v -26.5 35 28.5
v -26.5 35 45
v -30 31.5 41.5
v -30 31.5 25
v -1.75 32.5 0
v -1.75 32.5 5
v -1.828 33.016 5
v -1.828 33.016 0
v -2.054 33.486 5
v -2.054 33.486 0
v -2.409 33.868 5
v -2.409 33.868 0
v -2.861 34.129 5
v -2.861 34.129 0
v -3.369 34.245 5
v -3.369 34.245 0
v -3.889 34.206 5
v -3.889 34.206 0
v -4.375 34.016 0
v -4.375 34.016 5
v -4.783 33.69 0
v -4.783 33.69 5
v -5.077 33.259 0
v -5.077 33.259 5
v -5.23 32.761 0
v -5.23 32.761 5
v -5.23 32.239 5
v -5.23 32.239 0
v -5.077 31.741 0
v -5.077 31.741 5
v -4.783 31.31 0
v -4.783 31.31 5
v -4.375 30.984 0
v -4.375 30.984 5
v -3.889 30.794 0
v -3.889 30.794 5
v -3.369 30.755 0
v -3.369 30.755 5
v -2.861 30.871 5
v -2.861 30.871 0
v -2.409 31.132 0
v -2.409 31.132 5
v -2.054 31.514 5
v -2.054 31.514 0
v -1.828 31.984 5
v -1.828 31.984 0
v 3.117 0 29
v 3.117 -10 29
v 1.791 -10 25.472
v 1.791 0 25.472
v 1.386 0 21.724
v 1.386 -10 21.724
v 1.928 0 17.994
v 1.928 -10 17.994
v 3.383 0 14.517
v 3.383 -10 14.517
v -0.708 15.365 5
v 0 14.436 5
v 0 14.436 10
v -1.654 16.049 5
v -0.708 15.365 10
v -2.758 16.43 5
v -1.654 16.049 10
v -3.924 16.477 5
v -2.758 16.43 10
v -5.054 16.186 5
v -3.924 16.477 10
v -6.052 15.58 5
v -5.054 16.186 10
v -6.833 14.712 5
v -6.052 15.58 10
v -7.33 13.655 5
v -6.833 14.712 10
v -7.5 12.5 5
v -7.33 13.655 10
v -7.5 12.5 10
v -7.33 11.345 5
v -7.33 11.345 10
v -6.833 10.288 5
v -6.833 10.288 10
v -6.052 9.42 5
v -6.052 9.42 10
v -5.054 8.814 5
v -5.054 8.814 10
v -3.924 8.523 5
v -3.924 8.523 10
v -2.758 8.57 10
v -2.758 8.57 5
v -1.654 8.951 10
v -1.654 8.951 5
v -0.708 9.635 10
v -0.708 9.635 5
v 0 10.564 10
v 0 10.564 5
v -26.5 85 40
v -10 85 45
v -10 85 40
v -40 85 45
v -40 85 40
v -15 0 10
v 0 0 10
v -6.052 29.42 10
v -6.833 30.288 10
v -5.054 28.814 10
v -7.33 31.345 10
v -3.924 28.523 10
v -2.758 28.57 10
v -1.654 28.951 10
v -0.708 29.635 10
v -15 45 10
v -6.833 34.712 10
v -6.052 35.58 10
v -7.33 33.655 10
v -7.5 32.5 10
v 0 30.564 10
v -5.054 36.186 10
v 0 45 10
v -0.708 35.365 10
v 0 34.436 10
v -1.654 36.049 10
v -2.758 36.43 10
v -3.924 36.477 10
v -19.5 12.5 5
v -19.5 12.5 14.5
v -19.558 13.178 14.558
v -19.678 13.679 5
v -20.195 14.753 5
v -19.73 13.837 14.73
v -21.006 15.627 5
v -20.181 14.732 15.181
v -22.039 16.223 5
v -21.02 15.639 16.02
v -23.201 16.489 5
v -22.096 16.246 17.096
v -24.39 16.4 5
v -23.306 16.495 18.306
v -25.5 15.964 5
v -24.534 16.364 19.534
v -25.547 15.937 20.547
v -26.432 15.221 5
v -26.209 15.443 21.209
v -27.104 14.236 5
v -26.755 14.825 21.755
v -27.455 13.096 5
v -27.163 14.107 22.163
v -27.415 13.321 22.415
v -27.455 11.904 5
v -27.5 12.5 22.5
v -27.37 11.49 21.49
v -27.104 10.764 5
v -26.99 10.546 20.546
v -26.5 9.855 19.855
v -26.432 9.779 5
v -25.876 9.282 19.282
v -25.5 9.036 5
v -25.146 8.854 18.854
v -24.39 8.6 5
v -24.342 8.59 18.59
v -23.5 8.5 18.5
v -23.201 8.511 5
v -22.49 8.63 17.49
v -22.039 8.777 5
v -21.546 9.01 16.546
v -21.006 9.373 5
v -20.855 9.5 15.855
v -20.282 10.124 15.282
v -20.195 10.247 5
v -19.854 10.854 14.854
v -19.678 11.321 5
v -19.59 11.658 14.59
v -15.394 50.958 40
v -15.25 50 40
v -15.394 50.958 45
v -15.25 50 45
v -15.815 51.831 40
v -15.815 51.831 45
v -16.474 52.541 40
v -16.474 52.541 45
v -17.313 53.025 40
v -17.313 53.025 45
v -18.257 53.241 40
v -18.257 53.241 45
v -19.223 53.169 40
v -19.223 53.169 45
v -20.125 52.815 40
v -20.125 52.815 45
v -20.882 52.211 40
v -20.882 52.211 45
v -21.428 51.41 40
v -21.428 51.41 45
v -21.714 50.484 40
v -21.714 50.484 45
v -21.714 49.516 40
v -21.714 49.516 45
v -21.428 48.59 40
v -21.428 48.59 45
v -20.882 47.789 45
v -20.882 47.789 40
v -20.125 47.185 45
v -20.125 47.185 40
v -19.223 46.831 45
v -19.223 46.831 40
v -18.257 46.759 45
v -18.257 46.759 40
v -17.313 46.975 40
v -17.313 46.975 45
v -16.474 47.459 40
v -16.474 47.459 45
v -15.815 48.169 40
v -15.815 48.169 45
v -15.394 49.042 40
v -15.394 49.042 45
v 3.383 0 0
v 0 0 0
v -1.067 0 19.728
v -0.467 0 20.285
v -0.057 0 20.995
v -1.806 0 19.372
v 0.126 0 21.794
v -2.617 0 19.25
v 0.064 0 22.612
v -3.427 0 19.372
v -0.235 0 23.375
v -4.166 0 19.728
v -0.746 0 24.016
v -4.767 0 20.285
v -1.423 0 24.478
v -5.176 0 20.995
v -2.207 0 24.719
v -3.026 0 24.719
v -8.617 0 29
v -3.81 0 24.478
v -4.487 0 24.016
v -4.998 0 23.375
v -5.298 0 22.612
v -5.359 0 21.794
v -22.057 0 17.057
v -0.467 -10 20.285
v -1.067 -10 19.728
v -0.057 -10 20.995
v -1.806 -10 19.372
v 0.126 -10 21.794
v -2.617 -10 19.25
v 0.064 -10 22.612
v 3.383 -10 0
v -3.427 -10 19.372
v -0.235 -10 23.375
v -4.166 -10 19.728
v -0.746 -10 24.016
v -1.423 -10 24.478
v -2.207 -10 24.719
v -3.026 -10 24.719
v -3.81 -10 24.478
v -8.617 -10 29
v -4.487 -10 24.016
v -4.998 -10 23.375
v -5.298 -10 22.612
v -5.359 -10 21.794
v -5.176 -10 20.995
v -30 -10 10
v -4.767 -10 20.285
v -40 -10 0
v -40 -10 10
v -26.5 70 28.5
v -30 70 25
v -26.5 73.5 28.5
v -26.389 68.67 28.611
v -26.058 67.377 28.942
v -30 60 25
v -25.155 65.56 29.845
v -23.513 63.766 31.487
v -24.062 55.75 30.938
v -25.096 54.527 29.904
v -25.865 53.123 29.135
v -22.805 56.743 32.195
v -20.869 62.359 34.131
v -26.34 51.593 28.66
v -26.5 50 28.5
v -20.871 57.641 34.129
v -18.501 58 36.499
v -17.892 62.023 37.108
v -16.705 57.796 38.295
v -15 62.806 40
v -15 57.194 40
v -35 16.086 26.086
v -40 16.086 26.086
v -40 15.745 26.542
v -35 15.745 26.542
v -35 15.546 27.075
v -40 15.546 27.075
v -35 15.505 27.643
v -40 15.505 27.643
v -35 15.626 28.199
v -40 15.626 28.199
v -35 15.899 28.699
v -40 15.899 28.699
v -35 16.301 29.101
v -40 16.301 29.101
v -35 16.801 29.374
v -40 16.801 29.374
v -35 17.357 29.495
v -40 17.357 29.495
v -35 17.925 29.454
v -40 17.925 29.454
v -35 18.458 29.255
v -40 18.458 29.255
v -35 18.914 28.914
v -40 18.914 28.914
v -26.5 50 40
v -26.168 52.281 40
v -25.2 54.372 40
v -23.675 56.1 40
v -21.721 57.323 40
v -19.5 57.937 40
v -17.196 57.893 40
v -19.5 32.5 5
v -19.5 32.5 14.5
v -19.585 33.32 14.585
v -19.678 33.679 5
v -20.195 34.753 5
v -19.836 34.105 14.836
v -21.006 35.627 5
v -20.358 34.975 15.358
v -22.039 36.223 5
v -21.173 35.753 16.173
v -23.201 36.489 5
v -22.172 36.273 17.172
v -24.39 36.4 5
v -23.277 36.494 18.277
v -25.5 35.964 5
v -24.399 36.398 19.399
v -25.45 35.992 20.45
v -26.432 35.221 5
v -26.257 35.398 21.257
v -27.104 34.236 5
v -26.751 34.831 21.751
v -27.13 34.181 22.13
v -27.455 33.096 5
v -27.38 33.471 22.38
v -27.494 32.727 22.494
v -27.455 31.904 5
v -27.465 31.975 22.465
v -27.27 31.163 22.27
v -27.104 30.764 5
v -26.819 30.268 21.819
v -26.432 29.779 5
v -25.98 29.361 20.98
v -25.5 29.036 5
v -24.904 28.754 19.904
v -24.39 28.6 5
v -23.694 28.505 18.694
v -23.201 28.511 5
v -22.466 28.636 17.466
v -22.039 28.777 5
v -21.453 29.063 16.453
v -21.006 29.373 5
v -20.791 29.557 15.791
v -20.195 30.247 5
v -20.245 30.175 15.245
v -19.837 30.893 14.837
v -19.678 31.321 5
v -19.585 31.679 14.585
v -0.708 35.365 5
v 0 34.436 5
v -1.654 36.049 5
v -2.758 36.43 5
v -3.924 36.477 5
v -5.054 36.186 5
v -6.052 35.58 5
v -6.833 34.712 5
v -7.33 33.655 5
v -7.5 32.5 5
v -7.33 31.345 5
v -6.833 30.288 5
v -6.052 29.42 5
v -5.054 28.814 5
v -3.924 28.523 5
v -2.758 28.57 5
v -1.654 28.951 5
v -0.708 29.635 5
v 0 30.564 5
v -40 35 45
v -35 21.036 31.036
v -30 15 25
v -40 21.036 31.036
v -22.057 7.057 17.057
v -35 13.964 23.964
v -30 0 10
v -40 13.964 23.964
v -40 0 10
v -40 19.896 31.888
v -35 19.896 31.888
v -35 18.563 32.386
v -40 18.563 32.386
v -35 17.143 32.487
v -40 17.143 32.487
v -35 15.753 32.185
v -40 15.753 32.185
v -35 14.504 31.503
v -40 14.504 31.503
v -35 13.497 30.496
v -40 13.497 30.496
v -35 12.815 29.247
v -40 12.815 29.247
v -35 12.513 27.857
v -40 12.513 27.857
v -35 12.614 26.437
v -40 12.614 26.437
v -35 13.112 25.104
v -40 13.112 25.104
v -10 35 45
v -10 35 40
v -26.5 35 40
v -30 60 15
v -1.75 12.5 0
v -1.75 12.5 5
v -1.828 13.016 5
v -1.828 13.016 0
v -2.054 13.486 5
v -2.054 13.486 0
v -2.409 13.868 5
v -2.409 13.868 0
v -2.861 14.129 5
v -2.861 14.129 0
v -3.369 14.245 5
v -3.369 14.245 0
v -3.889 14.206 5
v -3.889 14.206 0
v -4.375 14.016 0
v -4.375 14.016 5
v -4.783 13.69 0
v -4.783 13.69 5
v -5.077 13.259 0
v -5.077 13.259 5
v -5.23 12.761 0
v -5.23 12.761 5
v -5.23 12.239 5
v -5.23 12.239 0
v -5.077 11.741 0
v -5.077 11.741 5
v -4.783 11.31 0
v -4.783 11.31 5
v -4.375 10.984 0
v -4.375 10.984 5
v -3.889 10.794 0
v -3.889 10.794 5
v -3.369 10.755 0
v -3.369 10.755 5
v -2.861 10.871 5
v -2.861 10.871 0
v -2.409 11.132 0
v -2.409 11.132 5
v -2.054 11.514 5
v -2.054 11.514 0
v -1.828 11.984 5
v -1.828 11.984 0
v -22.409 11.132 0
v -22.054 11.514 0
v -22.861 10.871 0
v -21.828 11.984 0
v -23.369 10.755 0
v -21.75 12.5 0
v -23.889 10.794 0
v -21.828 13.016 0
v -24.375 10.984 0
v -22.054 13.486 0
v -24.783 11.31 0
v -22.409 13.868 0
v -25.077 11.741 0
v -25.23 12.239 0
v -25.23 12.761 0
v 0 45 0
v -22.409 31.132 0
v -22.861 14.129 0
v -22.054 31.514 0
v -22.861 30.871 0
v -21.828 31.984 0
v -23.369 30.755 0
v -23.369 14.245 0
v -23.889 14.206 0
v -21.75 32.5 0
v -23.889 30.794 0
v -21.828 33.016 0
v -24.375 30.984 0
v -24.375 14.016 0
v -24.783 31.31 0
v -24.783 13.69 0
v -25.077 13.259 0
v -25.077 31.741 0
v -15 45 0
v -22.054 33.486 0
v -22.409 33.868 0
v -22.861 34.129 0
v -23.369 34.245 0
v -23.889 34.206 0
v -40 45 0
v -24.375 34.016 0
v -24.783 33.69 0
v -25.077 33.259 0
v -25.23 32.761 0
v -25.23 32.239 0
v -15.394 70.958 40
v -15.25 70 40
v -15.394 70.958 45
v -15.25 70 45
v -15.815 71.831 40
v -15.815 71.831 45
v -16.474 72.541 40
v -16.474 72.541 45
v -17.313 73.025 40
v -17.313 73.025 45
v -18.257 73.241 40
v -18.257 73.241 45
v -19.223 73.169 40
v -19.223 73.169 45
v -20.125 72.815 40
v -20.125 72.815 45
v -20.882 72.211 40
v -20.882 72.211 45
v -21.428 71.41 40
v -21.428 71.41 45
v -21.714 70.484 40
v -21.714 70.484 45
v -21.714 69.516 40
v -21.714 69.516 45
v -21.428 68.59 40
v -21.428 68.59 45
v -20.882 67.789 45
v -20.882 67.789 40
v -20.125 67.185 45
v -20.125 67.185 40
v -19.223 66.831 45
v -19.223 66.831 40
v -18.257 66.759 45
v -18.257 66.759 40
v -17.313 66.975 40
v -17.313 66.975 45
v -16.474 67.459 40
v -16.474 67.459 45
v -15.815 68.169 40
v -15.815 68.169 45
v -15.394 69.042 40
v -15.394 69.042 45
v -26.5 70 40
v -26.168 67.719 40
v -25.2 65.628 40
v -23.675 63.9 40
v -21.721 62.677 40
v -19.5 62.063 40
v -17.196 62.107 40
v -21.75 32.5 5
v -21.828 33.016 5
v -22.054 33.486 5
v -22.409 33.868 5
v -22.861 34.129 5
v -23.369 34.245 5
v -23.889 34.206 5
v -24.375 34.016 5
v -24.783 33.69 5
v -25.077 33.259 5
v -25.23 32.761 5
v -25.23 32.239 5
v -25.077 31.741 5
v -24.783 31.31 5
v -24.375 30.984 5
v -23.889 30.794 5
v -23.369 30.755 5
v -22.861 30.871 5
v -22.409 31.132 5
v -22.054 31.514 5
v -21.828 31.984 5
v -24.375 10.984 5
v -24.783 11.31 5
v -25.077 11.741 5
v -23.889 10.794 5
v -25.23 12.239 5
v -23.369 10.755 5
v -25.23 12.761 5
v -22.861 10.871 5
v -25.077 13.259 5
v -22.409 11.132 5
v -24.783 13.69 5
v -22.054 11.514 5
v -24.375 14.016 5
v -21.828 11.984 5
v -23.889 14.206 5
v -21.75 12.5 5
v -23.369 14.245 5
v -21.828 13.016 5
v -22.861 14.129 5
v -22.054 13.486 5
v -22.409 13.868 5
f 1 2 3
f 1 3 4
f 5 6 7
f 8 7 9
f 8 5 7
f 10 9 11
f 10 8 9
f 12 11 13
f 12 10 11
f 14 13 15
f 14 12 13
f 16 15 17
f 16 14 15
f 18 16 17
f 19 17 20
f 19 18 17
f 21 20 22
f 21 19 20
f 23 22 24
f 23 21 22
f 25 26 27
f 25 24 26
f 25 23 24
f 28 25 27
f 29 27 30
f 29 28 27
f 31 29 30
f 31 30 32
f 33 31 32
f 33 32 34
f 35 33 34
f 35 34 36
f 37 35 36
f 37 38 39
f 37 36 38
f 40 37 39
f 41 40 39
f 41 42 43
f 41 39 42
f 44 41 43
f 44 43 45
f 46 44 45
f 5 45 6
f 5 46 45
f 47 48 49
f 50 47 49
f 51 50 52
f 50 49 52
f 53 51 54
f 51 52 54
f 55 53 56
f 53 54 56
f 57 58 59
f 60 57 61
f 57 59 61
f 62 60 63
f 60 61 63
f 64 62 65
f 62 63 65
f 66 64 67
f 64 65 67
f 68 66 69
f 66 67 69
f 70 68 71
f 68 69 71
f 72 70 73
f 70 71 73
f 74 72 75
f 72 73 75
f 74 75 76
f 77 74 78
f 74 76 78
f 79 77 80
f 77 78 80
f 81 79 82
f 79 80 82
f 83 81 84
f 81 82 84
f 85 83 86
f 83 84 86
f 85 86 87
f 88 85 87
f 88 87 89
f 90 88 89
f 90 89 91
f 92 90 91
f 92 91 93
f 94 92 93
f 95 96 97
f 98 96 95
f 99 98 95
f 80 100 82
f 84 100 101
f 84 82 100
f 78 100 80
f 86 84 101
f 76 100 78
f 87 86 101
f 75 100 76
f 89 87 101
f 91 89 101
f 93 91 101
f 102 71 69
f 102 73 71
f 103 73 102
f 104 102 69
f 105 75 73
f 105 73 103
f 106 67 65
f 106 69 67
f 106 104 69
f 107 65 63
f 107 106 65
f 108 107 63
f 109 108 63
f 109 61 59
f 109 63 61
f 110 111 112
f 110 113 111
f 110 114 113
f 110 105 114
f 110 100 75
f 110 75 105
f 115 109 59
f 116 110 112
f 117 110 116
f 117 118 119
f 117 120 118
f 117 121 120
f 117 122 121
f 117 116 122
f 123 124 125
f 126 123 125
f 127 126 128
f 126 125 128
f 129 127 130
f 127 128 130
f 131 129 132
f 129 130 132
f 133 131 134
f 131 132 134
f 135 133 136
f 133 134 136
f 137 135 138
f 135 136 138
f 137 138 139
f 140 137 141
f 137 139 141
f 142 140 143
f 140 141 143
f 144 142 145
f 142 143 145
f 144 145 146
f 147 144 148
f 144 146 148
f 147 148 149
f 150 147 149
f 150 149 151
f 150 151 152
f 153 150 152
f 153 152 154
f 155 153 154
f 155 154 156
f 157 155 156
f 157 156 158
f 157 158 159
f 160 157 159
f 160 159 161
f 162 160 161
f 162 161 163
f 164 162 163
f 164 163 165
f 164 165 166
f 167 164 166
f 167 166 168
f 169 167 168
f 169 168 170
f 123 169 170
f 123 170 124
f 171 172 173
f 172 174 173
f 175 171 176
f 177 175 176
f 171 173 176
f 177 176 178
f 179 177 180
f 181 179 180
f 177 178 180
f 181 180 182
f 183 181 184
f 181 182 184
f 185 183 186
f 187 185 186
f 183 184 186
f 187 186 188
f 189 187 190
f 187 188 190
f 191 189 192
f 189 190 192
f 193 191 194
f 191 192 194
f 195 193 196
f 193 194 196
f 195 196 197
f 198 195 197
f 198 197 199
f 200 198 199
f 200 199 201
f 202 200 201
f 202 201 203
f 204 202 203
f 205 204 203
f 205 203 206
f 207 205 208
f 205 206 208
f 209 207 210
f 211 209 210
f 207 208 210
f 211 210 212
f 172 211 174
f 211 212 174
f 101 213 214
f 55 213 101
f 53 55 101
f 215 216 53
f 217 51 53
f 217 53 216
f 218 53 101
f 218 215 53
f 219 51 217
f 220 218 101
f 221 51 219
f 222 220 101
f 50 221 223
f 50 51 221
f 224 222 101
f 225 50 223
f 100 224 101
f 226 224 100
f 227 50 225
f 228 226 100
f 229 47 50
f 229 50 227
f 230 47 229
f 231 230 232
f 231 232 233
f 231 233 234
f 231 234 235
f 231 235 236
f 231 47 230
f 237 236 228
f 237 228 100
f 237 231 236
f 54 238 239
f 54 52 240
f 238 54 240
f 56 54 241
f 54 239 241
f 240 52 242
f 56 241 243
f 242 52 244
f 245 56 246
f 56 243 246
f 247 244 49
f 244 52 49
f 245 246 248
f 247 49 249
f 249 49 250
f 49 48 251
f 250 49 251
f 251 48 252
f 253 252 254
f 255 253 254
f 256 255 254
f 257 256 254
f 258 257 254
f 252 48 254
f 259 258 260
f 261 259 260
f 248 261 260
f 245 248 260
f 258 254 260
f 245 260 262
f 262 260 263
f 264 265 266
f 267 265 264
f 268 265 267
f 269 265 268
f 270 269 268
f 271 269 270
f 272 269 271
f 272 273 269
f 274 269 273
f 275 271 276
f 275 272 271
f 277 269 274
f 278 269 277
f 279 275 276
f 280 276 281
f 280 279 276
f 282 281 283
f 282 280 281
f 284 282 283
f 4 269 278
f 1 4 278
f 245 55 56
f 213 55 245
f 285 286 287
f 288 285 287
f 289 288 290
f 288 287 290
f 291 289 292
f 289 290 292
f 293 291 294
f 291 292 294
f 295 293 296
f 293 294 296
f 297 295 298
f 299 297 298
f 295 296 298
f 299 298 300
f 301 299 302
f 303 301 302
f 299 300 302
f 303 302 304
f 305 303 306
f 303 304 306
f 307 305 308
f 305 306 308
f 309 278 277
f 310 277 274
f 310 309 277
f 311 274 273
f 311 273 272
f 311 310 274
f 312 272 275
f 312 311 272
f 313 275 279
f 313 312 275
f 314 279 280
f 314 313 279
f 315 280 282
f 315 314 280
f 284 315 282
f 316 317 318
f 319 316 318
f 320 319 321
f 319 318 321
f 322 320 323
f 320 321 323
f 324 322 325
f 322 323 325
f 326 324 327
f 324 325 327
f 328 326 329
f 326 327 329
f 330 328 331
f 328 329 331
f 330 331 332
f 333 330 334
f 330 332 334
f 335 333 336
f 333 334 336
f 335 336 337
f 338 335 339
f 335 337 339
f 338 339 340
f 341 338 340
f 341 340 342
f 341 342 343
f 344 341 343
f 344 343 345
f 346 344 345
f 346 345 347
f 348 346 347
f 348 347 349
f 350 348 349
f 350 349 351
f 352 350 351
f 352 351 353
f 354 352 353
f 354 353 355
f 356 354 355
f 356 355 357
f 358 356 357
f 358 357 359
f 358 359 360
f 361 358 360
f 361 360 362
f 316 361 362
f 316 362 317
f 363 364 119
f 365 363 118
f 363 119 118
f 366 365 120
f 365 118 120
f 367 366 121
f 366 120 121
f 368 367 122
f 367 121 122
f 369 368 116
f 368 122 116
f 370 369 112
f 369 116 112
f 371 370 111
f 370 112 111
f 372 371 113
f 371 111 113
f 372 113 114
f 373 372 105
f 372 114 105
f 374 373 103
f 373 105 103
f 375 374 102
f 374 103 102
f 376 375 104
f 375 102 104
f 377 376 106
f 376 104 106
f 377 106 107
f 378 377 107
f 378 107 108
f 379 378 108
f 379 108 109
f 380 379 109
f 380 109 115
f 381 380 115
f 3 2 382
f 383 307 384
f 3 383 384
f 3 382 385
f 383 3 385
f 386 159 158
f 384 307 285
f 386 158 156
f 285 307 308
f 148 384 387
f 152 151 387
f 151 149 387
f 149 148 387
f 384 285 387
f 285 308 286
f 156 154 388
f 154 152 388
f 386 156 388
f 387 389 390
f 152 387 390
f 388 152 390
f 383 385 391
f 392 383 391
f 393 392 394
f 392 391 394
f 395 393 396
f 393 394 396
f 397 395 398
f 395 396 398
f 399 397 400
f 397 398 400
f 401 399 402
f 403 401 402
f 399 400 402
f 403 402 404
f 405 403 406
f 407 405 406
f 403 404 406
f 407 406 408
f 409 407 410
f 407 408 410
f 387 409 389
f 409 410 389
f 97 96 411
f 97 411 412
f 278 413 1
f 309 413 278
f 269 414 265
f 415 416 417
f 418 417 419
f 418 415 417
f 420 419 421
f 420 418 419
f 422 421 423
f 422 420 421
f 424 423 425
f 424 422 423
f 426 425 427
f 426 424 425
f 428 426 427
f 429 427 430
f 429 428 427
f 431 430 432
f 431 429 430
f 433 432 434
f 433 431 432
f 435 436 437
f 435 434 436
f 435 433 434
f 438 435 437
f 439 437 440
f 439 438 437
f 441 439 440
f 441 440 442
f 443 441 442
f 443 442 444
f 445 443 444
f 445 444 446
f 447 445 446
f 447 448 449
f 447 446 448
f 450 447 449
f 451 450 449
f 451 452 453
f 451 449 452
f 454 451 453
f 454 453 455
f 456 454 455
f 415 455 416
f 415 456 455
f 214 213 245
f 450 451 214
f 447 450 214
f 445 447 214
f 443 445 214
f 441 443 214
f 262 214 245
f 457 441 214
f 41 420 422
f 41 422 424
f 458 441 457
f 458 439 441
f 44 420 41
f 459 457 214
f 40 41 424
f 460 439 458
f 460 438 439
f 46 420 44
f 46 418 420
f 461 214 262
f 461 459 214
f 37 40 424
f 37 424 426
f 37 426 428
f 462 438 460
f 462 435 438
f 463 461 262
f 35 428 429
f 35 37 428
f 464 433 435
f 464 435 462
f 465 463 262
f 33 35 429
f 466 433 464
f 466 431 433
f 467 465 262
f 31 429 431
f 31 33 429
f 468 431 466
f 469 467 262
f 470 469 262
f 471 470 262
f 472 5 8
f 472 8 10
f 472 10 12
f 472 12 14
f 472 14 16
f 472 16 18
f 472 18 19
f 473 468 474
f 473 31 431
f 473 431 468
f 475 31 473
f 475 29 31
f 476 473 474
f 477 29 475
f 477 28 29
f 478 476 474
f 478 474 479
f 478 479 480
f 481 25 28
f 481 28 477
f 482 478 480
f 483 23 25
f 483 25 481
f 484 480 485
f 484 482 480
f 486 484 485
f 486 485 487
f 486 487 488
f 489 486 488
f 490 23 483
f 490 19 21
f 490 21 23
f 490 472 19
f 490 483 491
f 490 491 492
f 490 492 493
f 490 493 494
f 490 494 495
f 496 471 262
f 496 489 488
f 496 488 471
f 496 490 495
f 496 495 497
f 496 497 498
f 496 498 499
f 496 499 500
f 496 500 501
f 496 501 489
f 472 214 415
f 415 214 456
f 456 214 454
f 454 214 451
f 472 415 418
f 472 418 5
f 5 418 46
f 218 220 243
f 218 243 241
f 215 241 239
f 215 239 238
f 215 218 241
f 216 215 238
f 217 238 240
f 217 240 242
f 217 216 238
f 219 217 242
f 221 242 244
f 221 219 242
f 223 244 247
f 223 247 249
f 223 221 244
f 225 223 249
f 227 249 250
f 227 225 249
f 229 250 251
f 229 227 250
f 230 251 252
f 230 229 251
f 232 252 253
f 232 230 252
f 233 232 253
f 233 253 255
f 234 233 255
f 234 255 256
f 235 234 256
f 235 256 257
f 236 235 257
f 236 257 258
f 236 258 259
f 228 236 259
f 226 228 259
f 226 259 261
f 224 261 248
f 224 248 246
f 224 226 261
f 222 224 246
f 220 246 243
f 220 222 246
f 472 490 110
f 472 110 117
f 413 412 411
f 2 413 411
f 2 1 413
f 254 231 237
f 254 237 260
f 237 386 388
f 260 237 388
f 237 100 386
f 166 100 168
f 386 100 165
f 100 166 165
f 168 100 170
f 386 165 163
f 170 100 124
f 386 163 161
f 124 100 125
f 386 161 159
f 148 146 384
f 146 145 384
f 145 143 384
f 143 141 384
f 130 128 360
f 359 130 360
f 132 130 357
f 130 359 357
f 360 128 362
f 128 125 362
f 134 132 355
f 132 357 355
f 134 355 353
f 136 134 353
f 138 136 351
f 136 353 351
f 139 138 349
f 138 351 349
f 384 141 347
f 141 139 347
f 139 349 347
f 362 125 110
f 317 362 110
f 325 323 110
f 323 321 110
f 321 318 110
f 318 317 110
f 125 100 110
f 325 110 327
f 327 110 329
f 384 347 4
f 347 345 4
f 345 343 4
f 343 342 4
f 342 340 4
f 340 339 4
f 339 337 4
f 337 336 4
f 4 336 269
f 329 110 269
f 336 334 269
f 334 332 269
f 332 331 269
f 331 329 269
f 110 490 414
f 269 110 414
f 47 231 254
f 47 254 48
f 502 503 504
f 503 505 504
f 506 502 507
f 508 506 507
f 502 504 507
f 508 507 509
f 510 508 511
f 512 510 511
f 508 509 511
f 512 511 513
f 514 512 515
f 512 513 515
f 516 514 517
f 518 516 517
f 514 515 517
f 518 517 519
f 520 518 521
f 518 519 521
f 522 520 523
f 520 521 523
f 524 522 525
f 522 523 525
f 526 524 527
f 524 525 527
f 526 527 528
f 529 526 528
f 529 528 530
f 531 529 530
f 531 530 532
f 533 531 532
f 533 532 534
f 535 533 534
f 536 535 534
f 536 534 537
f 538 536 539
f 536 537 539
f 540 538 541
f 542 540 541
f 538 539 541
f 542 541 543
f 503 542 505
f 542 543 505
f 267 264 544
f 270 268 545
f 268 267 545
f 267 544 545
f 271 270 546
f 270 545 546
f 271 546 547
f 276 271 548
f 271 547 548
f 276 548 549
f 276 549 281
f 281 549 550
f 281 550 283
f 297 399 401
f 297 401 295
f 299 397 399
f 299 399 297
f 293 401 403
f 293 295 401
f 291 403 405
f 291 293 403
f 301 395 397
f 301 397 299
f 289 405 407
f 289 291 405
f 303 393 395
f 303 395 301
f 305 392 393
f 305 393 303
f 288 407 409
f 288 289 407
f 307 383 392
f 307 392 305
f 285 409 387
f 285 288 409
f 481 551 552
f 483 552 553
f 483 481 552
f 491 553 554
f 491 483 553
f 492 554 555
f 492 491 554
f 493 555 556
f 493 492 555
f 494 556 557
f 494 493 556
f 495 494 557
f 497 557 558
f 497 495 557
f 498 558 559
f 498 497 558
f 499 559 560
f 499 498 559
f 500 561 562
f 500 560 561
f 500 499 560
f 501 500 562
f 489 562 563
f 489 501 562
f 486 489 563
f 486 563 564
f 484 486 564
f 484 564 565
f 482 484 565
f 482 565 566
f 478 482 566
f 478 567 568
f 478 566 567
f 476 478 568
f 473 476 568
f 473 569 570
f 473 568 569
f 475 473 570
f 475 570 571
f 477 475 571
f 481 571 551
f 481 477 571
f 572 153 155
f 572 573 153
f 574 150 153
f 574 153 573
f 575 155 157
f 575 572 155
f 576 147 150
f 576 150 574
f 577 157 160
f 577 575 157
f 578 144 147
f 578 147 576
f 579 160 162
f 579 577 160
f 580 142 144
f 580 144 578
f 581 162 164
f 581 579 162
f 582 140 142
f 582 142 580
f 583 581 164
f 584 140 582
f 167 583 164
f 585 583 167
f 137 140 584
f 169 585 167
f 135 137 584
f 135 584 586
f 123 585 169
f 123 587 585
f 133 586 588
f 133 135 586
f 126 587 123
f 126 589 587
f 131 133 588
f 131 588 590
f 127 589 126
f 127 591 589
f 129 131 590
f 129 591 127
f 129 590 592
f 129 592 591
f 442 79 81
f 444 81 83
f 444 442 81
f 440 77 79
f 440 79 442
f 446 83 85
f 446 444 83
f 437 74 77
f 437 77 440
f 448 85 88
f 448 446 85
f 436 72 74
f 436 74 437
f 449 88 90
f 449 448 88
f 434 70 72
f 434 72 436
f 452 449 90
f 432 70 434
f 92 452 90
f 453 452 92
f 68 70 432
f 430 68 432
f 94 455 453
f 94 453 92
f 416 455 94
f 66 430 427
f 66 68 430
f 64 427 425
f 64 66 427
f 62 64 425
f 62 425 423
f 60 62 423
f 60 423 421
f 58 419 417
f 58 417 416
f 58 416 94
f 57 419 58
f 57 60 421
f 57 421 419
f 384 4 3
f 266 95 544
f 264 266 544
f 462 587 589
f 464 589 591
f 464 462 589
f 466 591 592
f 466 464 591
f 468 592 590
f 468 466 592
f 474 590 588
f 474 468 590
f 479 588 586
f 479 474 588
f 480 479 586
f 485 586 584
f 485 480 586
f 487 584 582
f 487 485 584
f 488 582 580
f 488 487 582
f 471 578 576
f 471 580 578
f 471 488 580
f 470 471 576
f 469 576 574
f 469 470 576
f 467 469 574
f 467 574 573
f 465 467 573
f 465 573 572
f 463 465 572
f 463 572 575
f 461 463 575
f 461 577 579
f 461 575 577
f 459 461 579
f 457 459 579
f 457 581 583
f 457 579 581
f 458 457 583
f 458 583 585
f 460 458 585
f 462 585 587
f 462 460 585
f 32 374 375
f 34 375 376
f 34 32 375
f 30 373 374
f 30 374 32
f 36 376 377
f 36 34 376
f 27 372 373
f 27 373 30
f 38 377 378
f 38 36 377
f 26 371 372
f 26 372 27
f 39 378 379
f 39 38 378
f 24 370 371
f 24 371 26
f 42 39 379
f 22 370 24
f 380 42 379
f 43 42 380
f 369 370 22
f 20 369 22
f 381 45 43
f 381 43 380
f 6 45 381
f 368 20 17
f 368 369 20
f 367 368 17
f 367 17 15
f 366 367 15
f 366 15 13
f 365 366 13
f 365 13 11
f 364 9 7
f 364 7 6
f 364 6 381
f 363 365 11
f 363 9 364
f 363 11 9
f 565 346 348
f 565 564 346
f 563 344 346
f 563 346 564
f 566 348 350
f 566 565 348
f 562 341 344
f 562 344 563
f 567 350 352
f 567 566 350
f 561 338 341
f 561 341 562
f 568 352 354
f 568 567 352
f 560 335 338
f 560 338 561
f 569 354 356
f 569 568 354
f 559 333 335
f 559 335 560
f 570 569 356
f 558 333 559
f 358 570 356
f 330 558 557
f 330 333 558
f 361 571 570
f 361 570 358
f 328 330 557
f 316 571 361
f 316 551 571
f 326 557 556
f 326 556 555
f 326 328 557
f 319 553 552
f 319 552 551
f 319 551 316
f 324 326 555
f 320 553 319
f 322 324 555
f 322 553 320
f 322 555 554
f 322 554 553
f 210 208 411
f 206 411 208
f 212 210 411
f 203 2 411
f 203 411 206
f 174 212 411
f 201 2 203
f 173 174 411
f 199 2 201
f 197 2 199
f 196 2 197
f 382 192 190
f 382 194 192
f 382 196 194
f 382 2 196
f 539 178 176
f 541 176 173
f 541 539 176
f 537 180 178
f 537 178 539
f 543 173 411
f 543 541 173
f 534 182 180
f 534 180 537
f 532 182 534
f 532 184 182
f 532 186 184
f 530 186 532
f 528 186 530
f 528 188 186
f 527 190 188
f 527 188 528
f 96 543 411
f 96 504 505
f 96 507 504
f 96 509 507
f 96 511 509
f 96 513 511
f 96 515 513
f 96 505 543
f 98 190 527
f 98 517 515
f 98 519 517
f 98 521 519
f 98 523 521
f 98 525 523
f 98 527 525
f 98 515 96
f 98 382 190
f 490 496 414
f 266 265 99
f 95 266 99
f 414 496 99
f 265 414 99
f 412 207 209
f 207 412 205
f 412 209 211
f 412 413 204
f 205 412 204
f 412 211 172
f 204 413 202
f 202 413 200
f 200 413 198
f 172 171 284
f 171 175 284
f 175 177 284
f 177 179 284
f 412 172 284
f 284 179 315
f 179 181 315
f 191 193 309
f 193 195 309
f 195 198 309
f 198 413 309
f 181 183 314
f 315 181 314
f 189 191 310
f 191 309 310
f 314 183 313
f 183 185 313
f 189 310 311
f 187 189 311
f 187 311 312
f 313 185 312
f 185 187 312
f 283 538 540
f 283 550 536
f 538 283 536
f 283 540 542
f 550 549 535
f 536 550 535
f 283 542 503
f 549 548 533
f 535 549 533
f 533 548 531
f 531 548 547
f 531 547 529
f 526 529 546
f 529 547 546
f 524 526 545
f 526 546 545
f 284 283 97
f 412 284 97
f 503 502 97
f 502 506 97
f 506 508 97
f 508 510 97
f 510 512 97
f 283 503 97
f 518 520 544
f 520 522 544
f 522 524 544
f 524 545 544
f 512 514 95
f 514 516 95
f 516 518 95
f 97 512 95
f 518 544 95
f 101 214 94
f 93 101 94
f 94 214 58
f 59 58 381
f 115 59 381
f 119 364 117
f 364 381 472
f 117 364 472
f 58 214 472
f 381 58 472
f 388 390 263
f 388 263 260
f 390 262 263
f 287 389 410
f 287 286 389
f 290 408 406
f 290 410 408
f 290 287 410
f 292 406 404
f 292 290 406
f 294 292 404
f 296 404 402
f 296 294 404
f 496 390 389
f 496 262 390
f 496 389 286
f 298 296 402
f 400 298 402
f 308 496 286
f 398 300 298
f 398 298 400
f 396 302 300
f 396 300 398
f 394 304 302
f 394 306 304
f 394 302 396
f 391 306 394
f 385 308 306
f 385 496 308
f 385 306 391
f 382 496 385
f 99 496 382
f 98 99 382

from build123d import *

# Parameters (mm, degrees)
ESQUISSE1_W             = 40
ESQUISSE1_H             = 45
ESQUISSE1_R             = 1.75
BOSS_EXTRU_1_DEPTH      = 10
ESQUISSE2_R             = 4
ENL_V_MAT_EXTRU_2_DEPTH = 5
BOSS_EXTRU_2_DEPTH      = 10
ESQUISSE4_W             = 5
ESQUISSE4_H             = 50
BOSS_EXTRU_3_DEPTH      = 20
ENL_V_MAT_EXTRU_3_REACH = 106.163
ESQUISSE5_R             = 3.25
ESQUISSE8_R             = 2.75
BOSS_EXTRU_8_DEPTH      = 10
ENL_V_MAT_EXTRU_5_REACH = 114.472
ESQUISSE9_R             = 15
CHANFREIN2_SIZE         = 15
ENL_V_MAT_EXTRU_4_REACH = 104.103
CHANFREIN3_SIZE         = 3.5
BOSS_EXTRU_4_DEPTH      = 5


# Some blends are built 0.0001 mm under size
with BuildPart() as part:
    # Esquisse1 → Boss.-Extru.1 (new body)
    with BuildSketch(Plane.XY):
        with Locations((-20, 22.5)):
            Rectangle(ESQUISSE1_W, ESQUISSE1_H)
        with Locations((-3.5, 32.5)):
            Circle(ESQUISSE1_R, mode=Mode.SUBTRACT)
        with Locations((-23.5, 32.5)):
            Circle(ESQUISSE1_R, mode=Mode.SUBTRACT)
        with Locations((-23.5, 12.5)):
            Circle(ESQUISSE1_R, mode=Mode.SUBTRACT)
        with Locations((-3.5, 12.5)):
            Circle(ESQUISSE1_R, mode=Mode.SUBTRACT)
    extrude(amount=BOSS_EXTRU_1_DEPTH)

    # Esquisse2 → Enlèv. mat.-Extru.2 (cut)
    with BuildSketch(Plane.XY.offset(10)):
        with Locations((-23.5, 32.5)):
            Circle(ESQUISSE2_R)
        with Locations((-3.5, 32.5)):
            Circle(ESQUISSE2_R)
        with Locations((-23.5, 12.5)):
            Circle(ESQUISSE2_R)
        with Locations((-3.5, 12.5)):
            Circle(ESQUISSE2_R)
    extrude(amount=-ENL_V_MAT_EXTRU_2_DEPTH, mode=Mode.SUBTRACT)

    # Esquisse3 → Boss.-Extru.2 (add)
    with BuildSketch(Plane.ZY.offset(40)):
        Polygon((10, 0), (45, 35), (45, 85), (40, 85), (0, 45), (10, 45), align=None)
    extrude(amount=-BOSS_EXTRU_2_DEPTH)

    # Esquisse4 → Boss.-Extru.3 (add)
    with BuildSketch(Plane(origin=(-30, 0, 0), x_dir=(0, 0, -1), z_dir=(1, 0, 0))):
        with Locations((-42.5, 60)):
            Rectangle(ESQUISSE4_W, ESQUISSE4_H)
    extrude(amount=BOSS_EXTRU_3_DEPTH)

    # Esquisse5 → Enlèv. mat.-Extru.3 (cut, up to next)
    with BuildSketch(Plane.XY.offset(45), mode=Mode.PRIVATE) as enl_v_mat_extru_3_sk1:
        with Locations((-18.5, 70)):
            Circle(ESQUISSE5_R)
    enl_v_mat_extru_3_tool1 = extrude(enl_v_mat_extru_3_sk1.sketch, amount=-ENL_V_MAT_EXTRU_3_REACH, mode=Mode.PRIVATE) & part.part
    # Esquisse5 → Enlèv. mat.-Extru.3 (cut, up to next)
    with BuildSketch(Plane.XY.offset(45), mode=Mode.PRIVATE) as enl_v_mat_extru_3_sk2:
        with Locations((-18.5, 50)):
            Circle(ESQUISSE5_R)
    enl_v_mat_extru_3_tool2 = extrude(enl_v_mat_extru_3_sk2.sketch, amount=-ENL_V_MAT_EXTRU_3_REACH, mode=Mode.PRIVATE) & part.part
    add(enl_v_mat_extru_3_tool1.solids().sort_by_distance((-18.5, 70, 45))[0], mode=Mode.SUBTRACT)
    add(enl_v_mat_extru_3_tool2.solids().sort_by_distance((-18.5, 50, 45))[0], mode=Mode.SUBTRACT)

    # Esquisse8 → Boss.-Extru.8 (add)
    with BuildSketch(Plane.XZ):
        Polygon((3.3834406, 0), (-40, 0), (-40, 10), (-30, 10), (-8.6165594, 29), (3.3834406, 29), align=None)
        with Locations(Location((-2.6165594, 22, 0), (0, 0, 270))):
            Circle(ESQUISSE8_R, mode=Mode.SUBTRACT)
    extrude(amount=BOSS_EXTRU_8_DEPTH)

    # Esquisse9 → Enlèv. mat.-Extru.5 (cut, up to next)
    with BuildSketch(Plane.XZ.offset(10), mode=Mode.PRIVATE) as enl_v_mat_extru_5_sk1:
        with Locations((16.3834406, 22)):
            Circle(ESQUISSE9_R)
    enl_v_mat_extru_5_tool1 = extrude(enl_v_mat_extru_5_sk1.sketch, amount=-ENL_V_MAT_EXTRU_5_REACH, mode=Mode.PRIVATE) & part.part
    add(enl_v_mat_extru_5_tool1.solids().sort_by_distance((16.383441, -10, 22))[0], mode=Mode.SUBTRACT)

    # Chanfrein2
    # the kernel refuses this chamfer: 15 mm, written as the material it adds along each edge
    with BuildSketch(Plane(origin=(-30, 83.575244819, 10), x_dir=(1, 0, 0), z_dir=(0, -1, 0))) as chanfrein2_piece_1_section:
        Polygon((CHANFREIN2_SIZE, 0), (0, CHANFREIN2_SIZE), (0, 0), align=None)
    chanfrein2_piece_1 = extrude(amount=122.150489639, mode=Mode.PRIVATE)
    chanfrein2_piece_1 = split(chanfrein2_piece_1, bisect_by=Plane(origin=(-30, 69.28762241, 24.28762241), z_dir=(0, -0.707106781186543, 0.7071067811865521)), keep=Keep.TOP, mode=Mode.PRIVATE)
    chanfrein2_piece_1 = chanfrein2_piece_1 - Plane(origin=(-23.5, 12.5, 10), x_dir=(1, 0, 0), z_dir=(0, 0, 1)) * Cylinder(4, 305, mode=Mode.PRIVATE)
    chanfrein2_piece_1 = chanfrein2_piece_1 - Plane(origin=(-23.5, 32.5, 10), x_dir=(1, 0, 0), z_dir=(0, 0, 1)) * Cylinder(4, 305, mode=Mode.PRIVATE)
    chanfrein2_piece_1 = split(chanfrein2_piece_1, bisect_by=Plane(origin=(-30, 41.78762241, 51.78762241), z_dir=(0, 0.7071067811865328, -0.7071067811865622)), keep=Keep.TOP, mode=Mode.PRIVATE)
    chanfrein2_piece_1 = split(chanfrein2_piece_1, bisect_by=Plane(origin=(-41.78762241, 71.78762241, 10), z_dir=(-0.7071067811865475, -0.7071067811865477, 0)), keep=Keep.TOP, mode=Mode.PRIVATE)
    add(chanfrein2_piece_1)
    with BuildSketch(Plane(origin=(-30, 83.575244819, 10), x_dir=(1, 0, 0), z_dir=(0, -1, 0))) as chanfrein2_piece_2_section:
        Polygon((CHANFREIN2_SIZE, 0), (0, CHANFREIN2_SIZE), (0, 0), align=None)
    chanfrein2_piece_2 = extrude(amount=122.150489639, mode=Mode.PRIVATE)
    chanfrein2_piece_2 = split(chanfrein2_piece_2, bisect_by=Plane(origin=(-30, -10, 10), z_dir=(0, 1, 0)), keep=Keep.TOP, mode=Mode.PRIVATE)
    chanfrein2_piece_2 = split(chanfrein2_piece_2, bisect_by=Plane(origin=(-30, 41.78762241, 51.78762241), z_dir=(0, -0.7071067811865328, 0.7071067811865622)), keep=Keep.TOP, mode=Mode.PRIVATE)
    chanfrein2_piece_2 = split(chanfrein2_piece_2, bisect_by=Plane(origin=(-30, 83.575244819, 10), z_dir=(0.66421730691086, 0, -0.7475395435694919)), keep=Keep.TOP, mode=Mode.PRIVATE)
    add(chanfrein2_piece_2)
    with BuildSketch(Plane(origin=(-30, 45, -38.575244819), x_dir=(1, 0, 0), z_dir=(0, 0, 1))) as chanfrein2_piece_3_section:
        Polygon((CHANFREIN2_SIZE, 0), (0, CHANFREIN2_SIZE), (0, 0), align=None)
    chanfrein2_piece_3 = extrude(amount=87.150489639, mode=Mode.PRIVATE)
    chanfrein2_piece_3 = split(chanfrein2_piece_3, bisect_by=Plane(origin=(-30, 25.71237759, -19.28762241), z_dir=(0, -0.707106781186543, 0.7071067811865521)), keep=Keep.TOP, mode=Mode.PRIVATE)
    chanfrein2_piece_3 = split(chanfrein2_piece_3, bisect_by=Plane(origin=(1.78762241, 45, -6.78762241), z_dir=(-0.7071067811865476, 0, -0.7071067811865476)), keep=Keep.TOP, mode=Mode.PRIVATE)
    add(chanfrein2_piece_3)
    with BuildSketch(Plane(origin=(-30, 35, 40), x_dir=(0, 0, -1), z_dir=(0, 1, 0))) as chanfrein2_piece_4_section:
        Polygon((CHANFREIN2_SIZE, 0), (0, -CHANFREIN2_SIZE), (0, 0), align=None)
    chanfrein2_piece_4 = extrude(amount=88.575244819, mode=Mode.PRIVATE)
    chanfrein2_piece_4 = split(chanfrein2_piece_4, bisect_by=Plane(origin=(-30, 60, 15), z_dir=(0, -0.707106781186543, 0.7071067811865521)), keep=Keep.TOP, mode=Mode.PRIVATE)
    chanfrein2_piece_4 = chanfrein2_piece_4 - Plane(origin=(-18.5, 70, 40), x_dir=(1, 0, 0), z_dir=(0, 0, 1)) * Cylinder(3.25, 238, mode=Mode.PRIVATE)
    chanfrein2_piece_4 = chanfrein2_piece_4 - Plane(origin=(-18.5, 50, 40), x_dir=(1, 0, 0), z_dir=(0, 0, 1)) * Cylinder(3.25, 238, mode=Mode.PRIVATE)
    add(chanfrein2_piece_4)

    # Esquisse6 → Enlèv. mat.-Extru.4 (cut, up to next)
    with BuildSketch(Plane(origin=(0, 0, 40), x_dir=(-1, 0, 0), z_dir=(0, 0, -1)), mode=Mode.PRIVATE) as enl_v_mat_extru_4_sk1:
        with BuildLine():
            Line((10.5, 70), (10.5, 85))
            Line((10.5, 85), (26.5, 85))
            Line((26.5, 85), (26.5, 70))
            ThreePointArc((26.5, 70), (18.5, 62), (10.5, 70))
        make_face()
    enl_v_mat_extru_4_tool1 = extrude(enl_v_mat_extru_4_sk1.sketch, amount=ENL_V_MAT_EXTRU_4_REACH, mode=Mode.PRIVATE) & part.part
    # Esquisse6 → Enlèv. mat.-Extru.4 (cut, up to next)
    with BuildSketch(Plane(origin=(0, 0, 40), x_dir=(-1, 0, 0), z_dir=(0, 0, -1)), mode=Mode.PRIVATE) as enl_v_mat_extru_4_sk2:
        with BuildLine():
            Line((10.5, 50), (10.5, 35))
            Line((10.5, 35), (26.5, 35))
            Line((26.5, 35), (26.5, 50))
            ThreePointArc((26.5, 50), (18.5, 58), (10.5, 50))
        make_face()
    enl_v_mat_extru_4_tool2 = extrude(enl_v_mat_extru_4_sk2.sketch, amount=ENL_V_MAT_EXTRU_4_REACH, mode=Mode.PRIVATE) & part.part
    add(enl_v_mat_extru_4_tool1.solids().sort_by_distance((-18.5, 74.283507, 40))[0], mode=Mode.SUBTRACT)
    add(enl_v_mat_extru_4_tool2.solids().sort_by_distance((-18.5, 45.716493, 40))[0], mode=Mode.SUBTRACT)

    # Chanfrein3
    chanfrein3_edges = [part.edges().sort_by_distance(p)[0] for p in [
        (-30, 35, 35),
    ]]
    chamfer(chanfrein3_edges, length=CHANFREIN3_SIZE - 0.0001)  # a hair under: the kernel refuses the full size

    # Esquisse7 → Boss.-Extru.4 (add)
    with BuildSketch(Plane.ZY.offset(40)):
        with BuildLine():
            Line((28.914213562, 18.914213562), (31.035533906, 21.035533906))
            ThreePointArc((31.035533906, 21.035533906), (31.035533906, 13.964466094), (23.964466094, 13.964466094))
            Line((23.964466094, 13.964466094), (26.085786438, 16.085786438))
            ThreePointArc((26.085786438, 16.085786438), (28.914213562, 16.085786438), (28.914213562, 18.914213562))
        make_face()
    extrude(amount=-BOSS_EXTRU_4_DEPTH)


solid = part.part
